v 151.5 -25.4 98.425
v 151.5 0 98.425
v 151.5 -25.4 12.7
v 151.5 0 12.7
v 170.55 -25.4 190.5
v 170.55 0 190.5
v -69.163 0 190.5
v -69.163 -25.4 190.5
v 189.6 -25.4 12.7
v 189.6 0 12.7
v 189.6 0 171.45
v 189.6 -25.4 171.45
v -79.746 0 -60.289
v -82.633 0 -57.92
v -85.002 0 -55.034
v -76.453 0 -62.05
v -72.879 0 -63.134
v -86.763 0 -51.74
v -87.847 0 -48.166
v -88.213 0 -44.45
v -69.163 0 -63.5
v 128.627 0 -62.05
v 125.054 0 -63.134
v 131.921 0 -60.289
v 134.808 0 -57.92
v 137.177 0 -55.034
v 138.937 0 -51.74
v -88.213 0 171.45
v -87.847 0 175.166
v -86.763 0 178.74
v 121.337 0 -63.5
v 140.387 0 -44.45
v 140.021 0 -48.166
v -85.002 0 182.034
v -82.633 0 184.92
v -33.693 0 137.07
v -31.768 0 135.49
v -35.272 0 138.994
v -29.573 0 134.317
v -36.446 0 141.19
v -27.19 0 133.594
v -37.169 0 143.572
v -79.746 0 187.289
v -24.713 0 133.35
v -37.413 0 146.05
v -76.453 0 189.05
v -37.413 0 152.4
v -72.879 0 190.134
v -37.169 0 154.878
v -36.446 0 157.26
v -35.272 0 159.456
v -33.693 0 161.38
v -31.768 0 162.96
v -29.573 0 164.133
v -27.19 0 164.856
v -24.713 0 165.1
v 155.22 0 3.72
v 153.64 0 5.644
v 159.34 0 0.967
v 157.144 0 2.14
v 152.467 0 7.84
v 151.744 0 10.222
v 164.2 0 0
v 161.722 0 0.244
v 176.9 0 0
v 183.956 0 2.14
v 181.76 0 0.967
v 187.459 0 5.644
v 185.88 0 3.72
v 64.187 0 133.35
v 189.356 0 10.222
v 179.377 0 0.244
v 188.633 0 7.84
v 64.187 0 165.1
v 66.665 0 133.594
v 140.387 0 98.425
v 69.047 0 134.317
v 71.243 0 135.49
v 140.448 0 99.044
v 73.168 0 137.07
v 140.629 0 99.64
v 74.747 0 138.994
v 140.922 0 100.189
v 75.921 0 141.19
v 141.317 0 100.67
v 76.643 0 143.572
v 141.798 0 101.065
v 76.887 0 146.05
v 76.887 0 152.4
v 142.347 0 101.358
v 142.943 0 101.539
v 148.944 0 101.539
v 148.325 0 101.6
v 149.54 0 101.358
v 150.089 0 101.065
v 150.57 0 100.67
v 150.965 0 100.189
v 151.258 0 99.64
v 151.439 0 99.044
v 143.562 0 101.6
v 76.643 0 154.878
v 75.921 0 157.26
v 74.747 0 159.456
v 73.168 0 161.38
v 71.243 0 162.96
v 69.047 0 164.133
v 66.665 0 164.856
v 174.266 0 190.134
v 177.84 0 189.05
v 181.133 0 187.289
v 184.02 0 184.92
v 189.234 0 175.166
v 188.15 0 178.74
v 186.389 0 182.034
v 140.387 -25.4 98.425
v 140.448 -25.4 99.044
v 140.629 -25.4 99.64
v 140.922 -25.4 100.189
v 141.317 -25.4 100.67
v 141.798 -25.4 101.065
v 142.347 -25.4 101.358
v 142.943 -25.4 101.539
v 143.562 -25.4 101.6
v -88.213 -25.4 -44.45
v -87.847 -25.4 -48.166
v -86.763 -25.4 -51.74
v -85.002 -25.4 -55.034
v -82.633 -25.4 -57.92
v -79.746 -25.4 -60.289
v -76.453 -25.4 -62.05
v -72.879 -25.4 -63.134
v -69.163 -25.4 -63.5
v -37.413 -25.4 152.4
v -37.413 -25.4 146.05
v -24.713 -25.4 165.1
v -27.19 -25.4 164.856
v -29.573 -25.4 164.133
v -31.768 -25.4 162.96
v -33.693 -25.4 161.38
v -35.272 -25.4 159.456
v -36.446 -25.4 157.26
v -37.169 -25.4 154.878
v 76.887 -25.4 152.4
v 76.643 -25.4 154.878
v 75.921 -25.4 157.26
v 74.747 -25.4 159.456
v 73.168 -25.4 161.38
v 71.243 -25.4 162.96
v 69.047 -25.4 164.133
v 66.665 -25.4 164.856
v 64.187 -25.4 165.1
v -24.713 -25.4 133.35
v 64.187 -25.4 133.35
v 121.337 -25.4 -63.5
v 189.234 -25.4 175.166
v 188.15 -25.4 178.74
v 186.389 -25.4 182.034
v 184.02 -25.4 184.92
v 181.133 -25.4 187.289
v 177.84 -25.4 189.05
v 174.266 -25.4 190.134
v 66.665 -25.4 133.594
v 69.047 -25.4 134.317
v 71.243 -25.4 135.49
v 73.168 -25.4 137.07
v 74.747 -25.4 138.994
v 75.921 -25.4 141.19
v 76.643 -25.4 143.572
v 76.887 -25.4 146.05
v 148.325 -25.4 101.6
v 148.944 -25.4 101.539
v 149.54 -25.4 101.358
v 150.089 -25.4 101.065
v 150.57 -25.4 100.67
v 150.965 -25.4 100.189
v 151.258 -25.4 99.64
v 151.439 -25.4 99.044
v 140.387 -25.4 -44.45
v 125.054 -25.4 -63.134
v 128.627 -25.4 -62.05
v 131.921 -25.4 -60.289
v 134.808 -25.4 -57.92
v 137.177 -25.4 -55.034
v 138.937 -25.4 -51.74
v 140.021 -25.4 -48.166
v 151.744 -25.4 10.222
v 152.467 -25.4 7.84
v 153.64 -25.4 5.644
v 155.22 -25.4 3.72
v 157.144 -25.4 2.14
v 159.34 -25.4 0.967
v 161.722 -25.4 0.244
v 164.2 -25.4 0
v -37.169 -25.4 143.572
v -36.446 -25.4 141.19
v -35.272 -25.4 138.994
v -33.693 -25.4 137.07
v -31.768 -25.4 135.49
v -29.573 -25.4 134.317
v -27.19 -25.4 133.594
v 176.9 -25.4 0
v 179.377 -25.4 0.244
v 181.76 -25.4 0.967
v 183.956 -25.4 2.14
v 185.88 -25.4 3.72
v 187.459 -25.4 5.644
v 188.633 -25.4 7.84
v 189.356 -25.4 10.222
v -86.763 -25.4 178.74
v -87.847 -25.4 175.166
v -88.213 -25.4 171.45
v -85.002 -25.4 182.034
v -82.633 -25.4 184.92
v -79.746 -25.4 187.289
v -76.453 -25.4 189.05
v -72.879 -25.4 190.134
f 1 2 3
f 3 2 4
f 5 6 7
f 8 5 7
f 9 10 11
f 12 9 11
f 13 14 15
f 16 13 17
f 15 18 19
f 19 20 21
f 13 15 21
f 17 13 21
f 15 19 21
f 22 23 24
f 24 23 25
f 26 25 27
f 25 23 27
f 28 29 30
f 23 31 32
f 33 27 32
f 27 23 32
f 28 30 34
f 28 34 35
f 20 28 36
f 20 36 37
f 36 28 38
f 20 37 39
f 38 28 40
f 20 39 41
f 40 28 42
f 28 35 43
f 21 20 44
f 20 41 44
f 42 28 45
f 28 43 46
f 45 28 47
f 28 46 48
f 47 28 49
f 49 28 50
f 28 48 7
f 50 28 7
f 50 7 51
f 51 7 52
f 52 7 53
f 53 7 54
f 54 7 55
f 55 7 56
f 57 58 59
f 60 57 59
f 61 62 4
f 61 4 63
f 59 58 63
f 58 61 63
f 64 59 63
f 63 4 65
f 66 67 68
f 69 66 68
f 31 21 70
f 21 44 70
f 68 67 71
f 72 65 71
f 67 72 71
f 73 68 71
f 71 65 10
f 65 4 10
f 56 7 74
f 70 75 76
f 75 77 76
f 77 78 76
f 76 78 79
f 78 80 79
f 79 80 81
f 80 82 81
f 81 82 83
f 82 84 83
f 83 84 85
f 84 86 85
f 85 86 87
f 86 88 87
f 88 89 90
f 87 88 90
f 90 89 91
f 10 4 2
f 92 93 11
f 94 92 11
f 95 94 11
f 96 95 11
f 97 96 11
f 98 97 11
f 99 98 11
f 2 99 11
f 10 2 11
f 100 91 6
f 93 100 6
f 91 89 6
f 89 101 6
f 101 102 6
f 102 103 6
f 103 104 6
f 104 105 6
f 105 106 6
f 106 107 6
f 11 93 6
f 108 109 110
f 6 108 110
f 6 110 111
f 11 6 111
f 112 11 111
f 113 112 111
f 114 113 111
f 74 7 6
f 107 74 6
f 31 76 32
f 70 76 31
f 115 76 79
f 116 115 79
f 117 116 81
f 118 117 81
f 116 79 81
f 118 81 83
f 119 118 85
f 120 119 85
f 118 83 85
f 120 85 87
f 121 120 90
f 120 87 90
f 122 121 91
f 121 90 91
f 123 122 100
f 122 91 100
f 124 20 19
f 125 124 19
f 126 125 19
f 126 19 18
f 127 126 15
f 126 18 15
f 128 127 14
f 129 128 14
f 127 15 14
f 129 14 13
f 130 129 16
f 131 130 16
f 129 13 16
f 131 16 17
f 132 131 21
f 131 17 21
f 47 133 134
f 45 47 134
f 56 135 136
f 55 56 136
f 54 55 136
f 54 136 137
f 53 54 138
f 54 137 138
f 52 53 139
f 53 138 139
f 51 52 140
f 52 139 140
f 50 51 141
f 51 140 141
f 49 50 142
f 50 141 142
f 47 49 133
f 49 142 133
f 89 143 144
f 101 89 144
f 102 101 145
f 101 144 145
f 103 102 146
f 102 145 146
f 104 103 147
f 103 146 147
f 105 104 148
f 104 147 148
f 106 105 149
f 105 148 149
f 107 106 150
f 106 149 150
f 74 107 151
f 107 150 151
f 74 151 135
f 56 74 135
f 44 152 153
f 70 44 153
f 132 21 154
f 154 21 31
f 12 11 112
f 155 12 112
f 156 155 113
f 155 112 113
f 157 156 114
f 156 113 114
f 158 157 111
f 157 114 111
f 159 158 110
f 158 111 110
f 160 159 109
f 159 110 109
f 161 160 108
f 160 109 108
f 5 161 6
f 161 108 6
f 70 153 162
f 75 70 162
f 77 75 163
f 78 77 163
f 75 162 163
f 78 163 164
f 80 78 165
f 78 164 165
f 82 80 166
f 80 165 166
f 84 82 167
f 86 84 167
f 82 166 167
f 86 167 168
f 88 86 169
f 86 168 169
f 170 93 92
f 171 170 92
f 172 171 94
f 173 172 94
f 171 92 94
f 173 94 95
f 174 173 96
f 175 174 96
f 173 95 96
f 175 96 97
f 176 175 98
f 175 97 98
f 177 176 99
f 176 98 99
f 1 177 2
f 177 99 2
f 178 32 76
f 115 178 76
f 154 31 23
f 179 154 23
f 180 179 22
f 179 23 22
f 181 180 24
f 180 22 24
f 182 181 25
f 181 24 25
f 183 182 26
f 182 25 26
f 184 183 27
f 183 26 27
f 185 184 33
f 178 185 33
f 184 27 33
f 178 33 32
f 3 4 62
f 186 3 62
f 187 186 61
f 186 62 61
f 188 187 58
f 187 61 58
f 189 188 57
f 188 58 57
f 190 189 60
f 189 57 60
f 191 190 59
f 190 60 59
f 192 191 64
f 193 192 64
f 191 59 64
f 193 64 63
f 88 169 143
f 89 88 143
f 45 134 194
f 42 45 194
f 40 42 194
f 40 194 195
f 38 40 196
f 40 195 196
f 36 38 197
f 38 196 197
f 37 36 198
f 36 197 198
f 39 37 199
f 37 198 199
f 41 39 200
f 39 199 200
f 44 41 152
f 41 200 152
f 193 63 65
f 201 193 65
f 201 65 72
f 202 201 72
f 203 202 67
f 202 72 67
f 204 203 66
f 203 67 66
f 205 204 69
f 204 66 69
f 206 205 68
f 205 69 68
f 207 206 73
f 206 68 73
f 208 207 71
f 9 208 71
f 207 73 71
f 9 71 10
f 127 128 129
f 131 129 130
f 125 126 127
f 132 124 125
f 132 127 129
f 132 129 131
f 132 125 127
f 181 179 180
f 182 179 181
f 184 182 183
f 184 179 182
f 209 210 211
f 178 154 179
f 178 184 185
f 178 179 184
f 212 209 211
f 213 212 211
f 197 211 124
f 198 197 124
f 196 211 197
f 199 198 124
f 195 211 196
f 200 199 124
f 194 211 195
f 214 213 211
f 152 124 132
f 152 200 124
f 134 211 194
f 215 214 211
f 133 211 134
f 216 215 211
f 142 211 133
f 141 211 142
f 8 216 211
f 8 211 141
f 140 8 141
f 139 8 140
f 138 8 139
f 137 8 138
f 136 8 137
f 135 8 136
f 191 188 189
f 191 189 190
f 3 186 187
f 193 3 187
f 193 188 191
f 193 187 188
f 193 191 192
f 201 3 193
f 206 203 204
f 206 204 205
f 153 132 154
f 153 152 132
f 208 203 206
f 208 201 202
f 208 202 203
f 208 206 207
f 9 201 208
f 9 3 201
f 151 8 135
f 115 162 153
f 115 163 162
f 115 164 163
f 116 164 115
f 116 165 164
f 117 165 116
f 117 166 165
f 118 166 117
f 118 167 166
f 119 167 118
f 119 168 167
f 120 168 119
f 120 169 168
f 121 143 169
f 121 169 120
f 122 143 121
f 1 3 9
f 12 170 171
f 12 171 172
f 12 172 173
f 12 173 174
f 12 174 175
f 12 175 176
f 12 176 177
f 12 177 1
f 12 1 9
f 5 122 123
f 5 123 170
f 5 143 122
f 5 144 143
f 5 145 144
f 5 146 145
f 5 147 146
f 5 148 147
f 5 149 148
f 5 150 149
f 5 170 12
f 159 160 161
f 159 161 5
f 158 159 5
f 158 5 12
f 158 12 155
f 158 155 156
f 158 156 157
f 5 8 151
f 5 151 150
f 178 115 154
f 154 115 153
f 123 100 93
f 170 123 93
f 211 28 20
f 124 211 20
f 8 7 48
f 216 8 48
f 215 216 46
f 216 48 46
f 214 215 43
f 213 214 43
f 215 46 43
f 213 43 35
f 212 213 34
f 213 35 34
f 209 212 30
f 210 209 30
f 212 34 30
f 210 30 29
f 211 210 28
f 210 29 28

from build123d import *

# Parameters (mm, degrees)
F1_DEPTH = 25.4
F3_DEPTH = 25.401


with BuildPart() as f1:
    # F0 (on Front) → F1 (new body)
    with BuildSketch(Plane.XZ):
        with BuildLine():
            Line((170.549796, 190.5), (-69.162704, 190.5))
            ThreePointArc((-69.162704, 190.5), (-82.633088, 184.920384), (-88.212704, 171.45))
            Line((-88.212704, 171.45), (-88.212704, -44.45))
            ThreePointArc((-88.212704, -44.45), (-82.633088, -57.920384), (-69.162704, -63.5))
            Line((-69.162704, -63.5), (121.337296, -63.5))
            ThreePointArc((121.337296, -63.5), (134.80768, -57.920384), (140.387296, -44.45))
            Line((140.387296, -44.45), (140.387296, 98.425))
            ThreePointArc((140.387296, 98.425), (141.317232, 100.670064), (143.562296, 101.6))
            Line((143.562296, 101.6), (148.324796, 101.6))
            ThreePointArc((148.324796, 101.6), (150.56986, 100.670064), (151.499796, 98.425))
            Line((151.499796, 98.425), (151.499796, 12.7))
            ThreePointArc((151.499796, 12.7), (155.21954, 3.719744), (164.199796, 0))
            Line((164.199796, 0), (176.899796, 0))
            ThreePointArc((176.899796, 0), (185.880052, 3.719744), (189.599796, 12.7))
            Line((189.599796, 12.7), (189.599796, 171.45))
            ThreePointArc((189.599796, 171.45), (184.02018, 184.920384), (170.549796, 190.5))
        make_face()
    extrude(amount=F1_DEPTH)

    # F2 (on face) → F3 (cut, through all)
    with BuildSketch(Plane.XZ.offset(25.4)):
        with BuildLine():
            Line((64.187296, 165.1), (-24.712704, 165.1))
            ThreePointArc((-24.712704, 165.1), (-33.69296, 161.380256), (-37.412704, 152.4))
            Line((-37.412704, 152.4), (-37.412704, 146.05))
            ThreePointArc((-37.412704, 146.05), (-33.69296, 137.069744), (-24.712704, 133.35))
            Line((-24.712704, 133.35), (64.187296, 133.35))
            ThreePointArc((64.187296, 133.35), (73.167552, 137.069744), (76.887296, 146.05))
            Line((76.887296, 146.05), (76.887296, 152.4))
            ThreePointArc((76.887296, 152.4), (73.167552, 161.380256), (64.187296, 165.1))
        make_face()
    extrude(amount=-F3_DEPTH, mode=Mode.SUBTRACT)


solid = f1.part
